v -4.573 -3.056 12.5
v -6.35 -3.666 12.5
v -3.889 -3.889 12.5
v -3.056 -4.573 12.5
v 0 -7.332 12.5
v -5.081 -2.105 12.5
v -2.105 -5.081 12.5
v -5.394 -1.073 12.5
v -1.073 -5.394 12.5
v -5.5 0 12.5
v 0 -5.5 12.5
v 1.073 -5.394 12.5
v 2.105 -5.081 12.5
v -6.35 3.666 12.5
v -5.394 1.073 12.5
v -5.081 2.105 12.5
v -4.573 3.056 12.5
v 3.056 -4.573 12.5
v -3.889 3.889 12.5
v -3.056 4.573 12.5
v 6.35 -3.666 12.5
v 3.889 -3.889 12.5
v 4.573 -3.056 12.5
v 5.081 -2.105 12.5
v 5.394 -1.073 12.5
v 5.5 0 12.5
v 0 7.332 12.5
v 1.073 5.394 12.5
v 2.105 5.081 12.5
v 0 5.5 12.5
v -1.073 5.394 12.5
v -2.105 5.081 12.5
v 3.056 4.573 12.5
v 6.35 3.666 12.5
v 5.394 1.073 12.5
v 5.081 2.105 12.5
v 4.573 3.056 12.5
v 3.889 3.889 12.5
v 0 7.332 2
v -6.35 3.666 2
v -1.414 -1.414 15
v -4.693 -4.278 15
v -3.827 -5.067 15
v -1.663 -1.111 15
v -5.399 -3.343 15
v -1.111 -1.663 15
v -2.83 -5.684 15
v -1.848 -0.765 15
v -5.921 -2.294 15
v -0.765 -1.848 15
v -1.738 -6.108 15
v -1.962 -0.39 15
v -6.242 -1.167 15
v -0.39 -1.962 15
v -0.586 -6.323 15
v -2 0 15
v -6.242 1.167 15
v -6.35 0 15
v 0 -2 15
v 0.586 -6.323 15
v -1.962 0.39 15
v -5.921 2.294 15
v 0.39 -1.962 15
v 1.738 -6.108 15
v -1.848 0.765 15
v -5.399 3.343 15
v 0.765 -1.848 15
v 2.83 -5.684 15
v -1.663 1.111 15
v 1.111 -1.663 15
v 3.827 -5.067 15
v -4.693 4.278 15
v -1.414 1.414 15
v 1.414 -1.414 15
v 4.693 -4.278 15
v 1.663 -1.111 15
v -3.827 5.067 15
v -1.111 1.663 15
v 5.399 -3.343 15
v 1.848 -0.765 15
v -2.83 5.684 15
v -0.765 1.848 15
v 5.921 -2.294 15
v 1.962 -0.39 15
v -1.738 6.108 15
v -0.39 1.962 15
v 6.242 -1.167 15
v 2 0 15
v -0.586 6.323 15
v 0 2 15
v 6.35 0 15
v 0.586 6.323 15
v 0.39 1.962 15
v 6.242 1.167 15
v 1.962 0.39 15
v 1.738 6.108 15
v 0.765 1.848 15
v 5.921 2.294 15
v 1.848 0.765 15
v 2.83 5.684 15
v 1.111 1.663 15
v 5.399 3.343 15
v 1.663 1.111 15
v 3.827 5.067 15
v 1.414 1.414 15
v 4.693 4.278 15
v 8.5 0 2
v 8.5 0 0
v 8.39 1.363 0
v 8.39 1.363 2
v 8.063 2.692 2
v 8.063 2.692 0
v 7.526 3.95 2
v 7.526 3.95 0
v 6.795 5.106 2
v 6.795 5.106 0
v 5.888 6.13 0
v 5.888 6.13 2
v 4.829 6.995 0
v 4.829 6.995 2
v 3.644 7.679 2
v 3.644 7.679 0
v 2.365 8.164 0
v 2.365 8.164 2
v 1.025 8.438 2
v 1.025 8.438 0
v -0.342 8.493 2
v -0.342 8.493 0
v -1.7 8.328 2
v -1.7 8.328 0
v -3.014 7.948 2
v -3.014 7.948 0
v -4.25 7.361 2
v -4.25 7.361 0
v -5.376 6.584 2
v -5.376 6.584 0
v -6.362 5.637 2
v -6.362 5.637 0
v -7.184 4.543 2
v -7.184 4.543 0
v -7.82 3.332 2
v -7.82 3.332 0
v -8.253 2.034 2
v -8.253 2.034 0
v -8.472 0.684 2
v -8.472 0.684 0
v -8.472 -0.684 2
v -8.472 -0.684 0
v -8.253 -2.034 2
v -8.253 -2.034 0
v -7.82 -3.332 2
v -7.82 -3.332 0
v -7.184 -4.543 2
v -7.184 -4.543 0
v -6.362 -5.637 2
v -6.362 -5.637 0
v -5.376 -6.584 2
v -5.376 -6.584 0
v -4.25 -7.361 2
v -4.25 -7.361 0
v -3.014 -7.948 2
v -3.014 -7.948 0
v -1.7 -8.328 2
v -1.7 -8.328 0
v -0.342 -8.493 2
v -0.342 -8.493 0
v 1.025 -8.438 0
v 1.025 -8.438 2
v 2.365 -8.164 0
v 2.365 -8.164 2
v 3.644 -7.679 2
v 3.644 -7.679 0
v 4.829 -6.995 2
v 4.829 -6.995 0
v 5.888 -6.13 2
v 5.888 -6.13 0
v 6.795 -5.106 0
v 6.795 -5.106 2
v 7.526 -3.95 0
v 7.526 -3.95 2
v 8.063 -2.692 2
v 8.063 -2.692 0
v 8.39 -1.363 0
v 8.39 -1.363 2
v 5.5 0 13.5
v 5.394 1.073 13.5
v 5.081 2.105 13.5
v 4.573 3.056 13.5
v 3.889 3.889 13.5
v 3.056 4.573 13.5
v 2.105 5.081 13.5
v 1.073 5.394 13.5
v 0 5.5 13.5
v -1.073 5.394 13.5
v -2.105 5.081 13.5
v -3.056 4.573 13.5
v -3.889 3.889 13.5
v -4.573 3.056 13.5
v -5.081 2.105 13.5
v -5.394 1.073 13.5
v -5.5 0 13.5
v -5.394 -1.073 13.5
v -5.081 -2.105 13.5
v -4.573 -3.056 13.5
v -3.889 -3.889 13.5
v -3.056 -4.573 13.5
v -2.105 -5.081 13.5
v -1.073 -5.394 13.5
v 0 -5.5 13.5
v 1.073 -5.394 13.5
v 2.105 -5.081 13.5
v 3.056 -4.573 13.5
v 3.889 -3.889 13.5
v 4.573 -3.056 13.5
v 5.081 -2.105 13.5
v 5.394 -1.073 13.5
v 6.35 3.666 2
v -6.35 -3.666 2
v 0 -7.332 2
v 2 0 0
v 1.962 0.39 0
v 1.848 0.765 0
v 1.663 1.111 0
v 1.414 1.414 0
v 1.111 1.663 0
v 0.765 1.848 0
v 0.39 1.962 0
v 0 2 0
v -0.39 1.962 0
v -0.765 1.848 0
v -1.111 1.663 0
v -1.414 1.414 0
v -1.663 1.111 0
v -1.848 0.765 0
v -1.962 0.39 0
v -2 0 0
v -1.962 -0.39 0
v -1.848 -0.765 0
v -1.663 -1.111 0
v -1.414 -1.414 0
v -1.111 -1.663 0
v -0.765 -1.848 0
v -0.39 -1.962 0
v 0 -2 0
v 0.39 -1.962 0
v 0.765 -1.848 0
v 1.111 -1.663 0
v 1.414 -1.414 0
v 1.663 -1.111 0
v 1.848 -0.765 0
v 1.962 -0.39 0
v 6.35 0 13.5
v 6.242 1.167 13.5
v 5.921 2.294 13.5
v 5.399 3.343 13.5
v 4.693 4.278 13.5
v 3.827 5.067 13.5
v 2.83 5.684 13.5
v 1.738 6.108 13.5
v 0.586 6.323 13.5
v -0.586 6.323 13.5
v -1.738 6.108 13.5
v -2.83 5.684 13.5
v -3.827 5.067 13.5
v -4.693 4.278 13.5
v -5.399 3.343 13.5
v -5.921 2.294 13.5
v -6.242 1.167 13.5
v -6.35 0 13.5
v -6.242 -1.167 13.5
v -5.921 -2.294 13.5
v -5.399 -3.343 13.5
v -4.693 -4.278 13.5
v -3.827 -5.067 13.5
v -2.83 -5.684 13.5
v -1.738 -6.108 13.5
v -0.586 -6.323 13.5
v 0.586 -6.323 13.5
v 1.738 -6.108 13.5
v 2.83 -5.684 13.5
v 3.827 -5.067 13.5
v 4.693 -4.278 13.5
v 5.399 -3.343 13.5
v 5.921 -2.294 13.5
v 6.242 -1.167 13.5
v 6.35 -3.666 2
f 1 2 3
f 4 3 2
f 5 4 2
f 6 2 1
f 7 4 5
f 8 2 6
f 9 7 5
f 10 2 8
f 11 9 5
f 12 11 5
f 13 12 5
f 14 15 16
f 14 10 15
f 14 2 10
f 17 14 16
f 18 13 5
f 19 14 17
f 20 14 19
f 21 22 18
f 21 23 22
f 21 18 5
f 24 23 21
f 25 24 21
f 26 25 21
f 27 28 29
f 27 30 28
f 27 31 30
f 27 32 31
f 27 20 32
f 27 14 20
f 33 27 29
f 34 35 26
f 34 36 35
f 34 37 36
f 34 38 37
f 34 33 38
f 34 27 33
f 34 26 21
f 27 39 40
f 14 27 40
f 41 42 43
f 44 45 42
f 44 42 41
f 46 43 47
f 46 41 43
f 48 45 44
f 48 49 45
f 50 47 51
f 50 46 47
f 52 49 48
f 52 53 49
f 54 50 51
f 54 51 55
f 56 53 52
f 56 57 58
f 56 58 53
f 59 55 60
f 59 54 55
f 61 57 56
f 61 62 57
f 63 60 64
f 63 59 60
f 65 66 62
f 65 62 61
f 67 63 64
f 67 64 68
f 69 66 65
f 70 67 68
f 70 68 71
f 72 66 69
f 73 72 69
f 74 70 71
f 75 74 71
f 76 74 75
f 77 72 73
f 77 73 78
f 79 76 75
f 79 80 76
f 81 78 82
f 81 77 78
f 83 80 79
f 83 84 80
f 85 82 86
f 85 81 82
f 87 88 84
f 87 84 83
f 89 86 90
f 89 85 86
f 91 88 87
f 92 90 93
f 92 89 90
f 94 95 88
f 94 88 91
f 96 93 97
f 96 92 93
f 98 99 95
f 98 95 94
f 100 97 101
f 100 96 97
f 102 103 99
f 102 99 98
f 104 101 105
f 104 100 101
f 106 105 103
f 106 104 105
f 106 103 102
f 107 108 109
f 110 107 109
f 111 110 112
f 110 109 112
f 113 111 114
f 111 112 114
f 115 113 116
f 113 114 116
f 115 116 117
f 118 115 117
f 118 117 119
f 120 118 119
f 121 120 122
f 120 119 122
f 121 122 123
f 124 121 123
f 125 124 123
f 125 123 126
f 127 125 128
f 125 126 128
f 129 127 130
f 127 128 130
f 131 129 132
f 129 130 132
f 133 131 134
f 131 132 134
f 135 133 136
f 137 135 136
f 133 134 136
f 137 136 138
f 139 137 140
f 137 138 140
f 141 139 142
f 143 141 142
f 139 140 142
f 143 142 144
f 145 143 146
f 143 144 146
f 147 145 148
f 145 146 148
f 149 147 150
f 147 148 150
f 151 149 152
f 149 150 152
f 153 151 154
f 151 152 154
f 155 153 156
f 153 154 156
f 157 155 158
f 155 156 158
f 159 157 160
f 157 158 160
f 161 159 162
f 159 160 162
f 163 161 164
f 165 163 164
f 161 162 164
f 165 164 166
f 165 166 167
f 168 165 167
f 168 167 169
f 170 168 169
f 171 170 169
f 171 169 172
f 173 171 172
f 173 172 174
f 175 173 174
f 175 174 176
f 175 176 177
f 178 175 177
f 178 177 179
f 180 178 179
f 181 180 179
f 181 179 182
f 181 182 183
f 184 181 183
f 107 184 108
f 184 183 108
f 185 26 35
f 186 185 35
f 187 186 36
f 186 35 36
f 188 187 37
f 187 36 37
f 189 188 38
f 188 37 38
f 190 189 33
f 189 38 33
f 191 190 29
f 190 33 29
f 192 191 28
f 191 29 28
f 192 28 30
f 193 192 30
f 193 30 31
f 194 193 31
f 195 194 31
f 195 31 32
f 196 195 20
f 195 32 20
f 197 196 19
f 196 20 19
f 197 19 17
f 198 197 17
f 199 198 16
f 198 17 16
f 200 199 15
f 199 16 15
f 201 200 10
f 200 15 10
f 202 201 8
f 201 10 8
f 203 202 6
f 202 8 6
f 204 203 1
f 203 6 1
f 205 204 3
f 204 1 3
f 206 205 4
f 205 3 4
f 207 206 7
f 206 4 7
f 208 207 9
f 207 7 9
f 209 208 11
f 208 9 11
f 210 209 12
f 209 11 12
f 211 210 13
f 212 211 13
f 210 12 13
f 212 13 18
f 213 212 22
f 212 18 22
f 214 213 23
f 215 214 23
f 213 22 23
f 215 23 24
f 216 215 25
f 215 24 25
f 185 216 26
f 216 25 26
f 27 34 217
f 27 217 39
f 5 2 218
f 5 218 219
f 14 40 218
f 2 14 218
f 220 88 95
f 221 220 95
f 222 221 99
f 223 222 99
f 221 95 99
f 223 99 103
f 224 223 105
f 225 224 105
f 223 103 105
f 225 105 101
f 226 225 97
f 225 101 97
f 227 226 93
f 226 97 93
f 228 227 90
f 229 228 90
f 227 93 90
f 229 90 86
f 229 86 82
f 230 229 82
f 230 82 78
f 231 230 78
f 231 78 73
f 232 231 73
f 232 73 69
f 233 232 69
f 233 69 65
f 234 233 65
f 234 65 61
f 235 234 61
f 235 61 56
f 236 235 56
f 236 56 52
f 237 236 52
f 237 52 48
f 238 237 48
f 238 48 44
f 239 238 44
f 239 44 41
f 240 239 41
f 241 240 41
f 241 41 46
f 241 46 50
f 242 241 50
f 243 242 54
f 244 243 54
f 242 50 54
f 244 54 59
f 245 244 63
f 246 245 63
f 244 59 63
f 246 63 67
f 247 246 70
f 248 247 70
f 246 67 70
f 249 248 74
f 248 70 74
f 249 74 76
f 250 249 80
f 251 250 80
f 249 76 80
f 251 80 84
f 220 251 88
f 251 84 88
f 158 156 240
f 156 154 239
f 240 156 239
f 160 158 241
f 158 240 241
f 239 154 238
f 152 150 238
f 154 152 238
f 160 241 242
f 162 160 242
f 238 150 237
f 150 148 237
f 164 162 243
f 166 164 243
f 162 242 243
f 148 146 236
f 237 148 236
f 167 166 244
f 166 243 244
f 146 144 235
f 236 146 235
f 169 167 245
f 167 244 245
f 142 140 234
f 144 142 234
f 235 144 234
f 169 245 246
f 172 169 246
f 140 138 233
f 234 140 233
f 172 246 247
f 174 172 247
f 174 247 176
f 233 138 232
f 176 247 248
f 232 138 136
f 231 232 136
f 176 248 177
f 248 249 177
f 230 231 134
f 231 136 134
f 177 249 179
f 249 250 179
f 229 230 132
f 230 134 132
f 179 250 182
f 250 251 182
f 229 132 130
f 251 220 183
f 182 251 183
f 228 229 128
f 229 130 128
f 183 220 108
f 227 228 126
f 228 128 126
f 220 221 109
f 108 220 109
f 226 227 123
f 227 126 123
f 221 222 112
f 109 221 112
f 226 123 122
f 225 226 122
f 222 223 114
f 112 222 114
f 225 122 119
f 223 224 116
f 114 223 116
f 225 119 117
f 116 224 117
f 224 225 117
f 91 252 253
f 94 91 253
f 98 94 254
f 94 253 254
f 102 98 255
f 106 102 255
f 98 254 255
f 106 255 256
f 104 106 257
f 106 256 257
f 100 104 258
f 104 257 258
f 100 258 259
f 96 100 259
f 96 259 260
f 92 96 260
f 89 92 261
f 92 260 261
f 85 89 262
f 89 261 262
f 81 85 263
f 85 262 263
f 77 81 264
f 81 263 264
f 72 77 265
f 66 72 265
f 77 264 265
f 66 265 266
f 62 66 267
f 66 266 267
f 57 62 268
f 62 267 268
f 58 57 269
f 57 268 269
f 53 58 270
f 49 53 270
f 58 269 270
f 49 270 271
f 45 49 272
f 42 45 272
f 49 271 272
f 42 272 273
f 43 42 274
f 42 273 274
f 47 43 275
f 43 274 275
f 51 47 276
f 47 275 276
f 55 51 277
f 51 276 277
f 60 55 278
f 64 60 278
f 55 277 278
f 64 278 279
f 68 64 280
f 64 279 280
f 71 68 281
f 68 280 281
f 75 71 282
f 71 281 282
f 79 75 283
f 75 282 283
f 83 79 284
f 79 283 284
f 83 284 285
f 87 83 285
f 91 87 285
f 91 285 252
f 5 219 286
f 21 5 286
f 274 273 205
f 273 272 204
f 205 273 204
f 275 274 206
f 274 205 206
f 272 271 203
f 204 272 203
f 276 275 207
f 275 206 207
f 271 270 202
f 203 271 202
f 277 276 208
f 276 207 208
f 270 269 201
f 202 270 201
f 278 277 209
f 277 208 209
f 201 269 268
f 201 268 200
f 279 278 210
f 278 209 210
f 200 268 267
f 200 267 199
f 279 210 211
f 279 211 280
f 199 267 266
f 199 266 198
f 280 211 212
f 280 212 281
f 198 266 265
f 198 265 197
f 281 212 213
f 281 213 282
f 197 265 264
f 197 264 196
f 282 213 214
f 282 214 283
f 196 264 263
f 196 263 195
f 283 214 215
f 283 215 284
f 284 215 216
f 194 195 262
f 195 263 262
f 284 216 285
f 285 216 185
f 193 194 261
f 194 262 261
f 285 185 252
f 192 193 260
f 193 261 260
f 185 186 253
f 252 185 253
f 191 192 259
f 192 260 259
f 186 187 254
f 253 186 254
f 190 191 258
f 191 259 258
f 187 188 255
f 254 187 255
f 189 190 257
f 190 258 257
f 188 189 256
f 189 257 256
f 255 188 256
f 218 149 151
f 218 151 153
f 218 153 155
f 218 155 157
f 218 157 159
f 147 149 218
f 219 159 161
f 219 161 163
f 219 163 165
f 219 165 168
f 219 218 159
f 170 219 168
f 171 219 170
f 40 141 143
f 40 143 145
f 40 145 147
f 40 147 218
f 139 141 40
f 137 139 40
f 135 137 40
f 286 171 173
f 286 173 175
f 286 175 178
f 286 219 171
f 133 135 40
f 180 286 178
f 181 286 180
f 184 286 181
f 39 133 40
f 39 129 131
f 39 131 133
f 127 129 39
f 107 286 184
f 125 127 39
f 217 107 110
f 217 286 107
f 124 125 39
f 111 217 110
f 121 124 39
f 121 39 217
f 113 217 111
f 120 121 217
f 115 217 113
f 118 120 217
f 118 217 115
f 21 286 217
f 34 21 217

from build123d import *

# Parameters (mm, degrees)
ESQUISSE1_R             = 8.5
BOSS_EXTRU_1_DEPTH      = 2
BOSS_EXTRU_2_DEPTH      = 10.5
ESQUISSE3_R             = 5.5
BOSS_EXTRU_3_DEPTH      = 1
ESQUISSE4_R             = 6.35
BOSS_EXTRU_4_DEPTH      = 1.5
ESQUISSE5_R             = 2
ENL_V_MAT_EXTRU_1_DEPTH = 20.222382787


with BuildPart() as part:
    # Esquisse1 → Boss.-Extru.1 (new body)
    with BuildSketch(Plane.XY):
        Circle(ESQUISSE1_R)
    extrude(amount=BOSS_EXTRU_1_DEPTH)

    # Esquisse2 → Boss.-Extru.2 (add)
    with BuildSketch(Plane.XY.offset(2)):
        Polygon((6.35, -3.666174209), (6.35, 3.666174209), (0, 7.332348419), (-6.35, 3.666174209), (-6.35, -3.666174209), (0, -7.332348419), align=None)
    extrude(amount=BOSS_EXTRU_2_DEPTH)

    # Esquisse3 → Boss.-Extru.3 (add)
    with BuildSketch(Plane.XY.offset(12.5)):
        Circle(ESQUISSE3_R)
    extrude(amount=BOSS_EXTRU_3_DEPTH)

    # Esquisse4 → Boss.-Extru.4 (add)
    with BuildSketch(Plane.XY.offset(13.5)):
        Circle(ESQUISSE4_R)
    extrude(amount=BOSS_EXTRU_4_DEPTH)

    # Esquisse5 → Enlèv. mat.-Extru.1 (cut, through all)
    with BuildSketch(Plane.XY.offset(15)):
        Circle(ESQUISSE5_R)
    extrude(amount=-ENL_V_MAT_EXTRU_1_DEPTH, mode=Mode.SUBTRACT)


solid = part.part
